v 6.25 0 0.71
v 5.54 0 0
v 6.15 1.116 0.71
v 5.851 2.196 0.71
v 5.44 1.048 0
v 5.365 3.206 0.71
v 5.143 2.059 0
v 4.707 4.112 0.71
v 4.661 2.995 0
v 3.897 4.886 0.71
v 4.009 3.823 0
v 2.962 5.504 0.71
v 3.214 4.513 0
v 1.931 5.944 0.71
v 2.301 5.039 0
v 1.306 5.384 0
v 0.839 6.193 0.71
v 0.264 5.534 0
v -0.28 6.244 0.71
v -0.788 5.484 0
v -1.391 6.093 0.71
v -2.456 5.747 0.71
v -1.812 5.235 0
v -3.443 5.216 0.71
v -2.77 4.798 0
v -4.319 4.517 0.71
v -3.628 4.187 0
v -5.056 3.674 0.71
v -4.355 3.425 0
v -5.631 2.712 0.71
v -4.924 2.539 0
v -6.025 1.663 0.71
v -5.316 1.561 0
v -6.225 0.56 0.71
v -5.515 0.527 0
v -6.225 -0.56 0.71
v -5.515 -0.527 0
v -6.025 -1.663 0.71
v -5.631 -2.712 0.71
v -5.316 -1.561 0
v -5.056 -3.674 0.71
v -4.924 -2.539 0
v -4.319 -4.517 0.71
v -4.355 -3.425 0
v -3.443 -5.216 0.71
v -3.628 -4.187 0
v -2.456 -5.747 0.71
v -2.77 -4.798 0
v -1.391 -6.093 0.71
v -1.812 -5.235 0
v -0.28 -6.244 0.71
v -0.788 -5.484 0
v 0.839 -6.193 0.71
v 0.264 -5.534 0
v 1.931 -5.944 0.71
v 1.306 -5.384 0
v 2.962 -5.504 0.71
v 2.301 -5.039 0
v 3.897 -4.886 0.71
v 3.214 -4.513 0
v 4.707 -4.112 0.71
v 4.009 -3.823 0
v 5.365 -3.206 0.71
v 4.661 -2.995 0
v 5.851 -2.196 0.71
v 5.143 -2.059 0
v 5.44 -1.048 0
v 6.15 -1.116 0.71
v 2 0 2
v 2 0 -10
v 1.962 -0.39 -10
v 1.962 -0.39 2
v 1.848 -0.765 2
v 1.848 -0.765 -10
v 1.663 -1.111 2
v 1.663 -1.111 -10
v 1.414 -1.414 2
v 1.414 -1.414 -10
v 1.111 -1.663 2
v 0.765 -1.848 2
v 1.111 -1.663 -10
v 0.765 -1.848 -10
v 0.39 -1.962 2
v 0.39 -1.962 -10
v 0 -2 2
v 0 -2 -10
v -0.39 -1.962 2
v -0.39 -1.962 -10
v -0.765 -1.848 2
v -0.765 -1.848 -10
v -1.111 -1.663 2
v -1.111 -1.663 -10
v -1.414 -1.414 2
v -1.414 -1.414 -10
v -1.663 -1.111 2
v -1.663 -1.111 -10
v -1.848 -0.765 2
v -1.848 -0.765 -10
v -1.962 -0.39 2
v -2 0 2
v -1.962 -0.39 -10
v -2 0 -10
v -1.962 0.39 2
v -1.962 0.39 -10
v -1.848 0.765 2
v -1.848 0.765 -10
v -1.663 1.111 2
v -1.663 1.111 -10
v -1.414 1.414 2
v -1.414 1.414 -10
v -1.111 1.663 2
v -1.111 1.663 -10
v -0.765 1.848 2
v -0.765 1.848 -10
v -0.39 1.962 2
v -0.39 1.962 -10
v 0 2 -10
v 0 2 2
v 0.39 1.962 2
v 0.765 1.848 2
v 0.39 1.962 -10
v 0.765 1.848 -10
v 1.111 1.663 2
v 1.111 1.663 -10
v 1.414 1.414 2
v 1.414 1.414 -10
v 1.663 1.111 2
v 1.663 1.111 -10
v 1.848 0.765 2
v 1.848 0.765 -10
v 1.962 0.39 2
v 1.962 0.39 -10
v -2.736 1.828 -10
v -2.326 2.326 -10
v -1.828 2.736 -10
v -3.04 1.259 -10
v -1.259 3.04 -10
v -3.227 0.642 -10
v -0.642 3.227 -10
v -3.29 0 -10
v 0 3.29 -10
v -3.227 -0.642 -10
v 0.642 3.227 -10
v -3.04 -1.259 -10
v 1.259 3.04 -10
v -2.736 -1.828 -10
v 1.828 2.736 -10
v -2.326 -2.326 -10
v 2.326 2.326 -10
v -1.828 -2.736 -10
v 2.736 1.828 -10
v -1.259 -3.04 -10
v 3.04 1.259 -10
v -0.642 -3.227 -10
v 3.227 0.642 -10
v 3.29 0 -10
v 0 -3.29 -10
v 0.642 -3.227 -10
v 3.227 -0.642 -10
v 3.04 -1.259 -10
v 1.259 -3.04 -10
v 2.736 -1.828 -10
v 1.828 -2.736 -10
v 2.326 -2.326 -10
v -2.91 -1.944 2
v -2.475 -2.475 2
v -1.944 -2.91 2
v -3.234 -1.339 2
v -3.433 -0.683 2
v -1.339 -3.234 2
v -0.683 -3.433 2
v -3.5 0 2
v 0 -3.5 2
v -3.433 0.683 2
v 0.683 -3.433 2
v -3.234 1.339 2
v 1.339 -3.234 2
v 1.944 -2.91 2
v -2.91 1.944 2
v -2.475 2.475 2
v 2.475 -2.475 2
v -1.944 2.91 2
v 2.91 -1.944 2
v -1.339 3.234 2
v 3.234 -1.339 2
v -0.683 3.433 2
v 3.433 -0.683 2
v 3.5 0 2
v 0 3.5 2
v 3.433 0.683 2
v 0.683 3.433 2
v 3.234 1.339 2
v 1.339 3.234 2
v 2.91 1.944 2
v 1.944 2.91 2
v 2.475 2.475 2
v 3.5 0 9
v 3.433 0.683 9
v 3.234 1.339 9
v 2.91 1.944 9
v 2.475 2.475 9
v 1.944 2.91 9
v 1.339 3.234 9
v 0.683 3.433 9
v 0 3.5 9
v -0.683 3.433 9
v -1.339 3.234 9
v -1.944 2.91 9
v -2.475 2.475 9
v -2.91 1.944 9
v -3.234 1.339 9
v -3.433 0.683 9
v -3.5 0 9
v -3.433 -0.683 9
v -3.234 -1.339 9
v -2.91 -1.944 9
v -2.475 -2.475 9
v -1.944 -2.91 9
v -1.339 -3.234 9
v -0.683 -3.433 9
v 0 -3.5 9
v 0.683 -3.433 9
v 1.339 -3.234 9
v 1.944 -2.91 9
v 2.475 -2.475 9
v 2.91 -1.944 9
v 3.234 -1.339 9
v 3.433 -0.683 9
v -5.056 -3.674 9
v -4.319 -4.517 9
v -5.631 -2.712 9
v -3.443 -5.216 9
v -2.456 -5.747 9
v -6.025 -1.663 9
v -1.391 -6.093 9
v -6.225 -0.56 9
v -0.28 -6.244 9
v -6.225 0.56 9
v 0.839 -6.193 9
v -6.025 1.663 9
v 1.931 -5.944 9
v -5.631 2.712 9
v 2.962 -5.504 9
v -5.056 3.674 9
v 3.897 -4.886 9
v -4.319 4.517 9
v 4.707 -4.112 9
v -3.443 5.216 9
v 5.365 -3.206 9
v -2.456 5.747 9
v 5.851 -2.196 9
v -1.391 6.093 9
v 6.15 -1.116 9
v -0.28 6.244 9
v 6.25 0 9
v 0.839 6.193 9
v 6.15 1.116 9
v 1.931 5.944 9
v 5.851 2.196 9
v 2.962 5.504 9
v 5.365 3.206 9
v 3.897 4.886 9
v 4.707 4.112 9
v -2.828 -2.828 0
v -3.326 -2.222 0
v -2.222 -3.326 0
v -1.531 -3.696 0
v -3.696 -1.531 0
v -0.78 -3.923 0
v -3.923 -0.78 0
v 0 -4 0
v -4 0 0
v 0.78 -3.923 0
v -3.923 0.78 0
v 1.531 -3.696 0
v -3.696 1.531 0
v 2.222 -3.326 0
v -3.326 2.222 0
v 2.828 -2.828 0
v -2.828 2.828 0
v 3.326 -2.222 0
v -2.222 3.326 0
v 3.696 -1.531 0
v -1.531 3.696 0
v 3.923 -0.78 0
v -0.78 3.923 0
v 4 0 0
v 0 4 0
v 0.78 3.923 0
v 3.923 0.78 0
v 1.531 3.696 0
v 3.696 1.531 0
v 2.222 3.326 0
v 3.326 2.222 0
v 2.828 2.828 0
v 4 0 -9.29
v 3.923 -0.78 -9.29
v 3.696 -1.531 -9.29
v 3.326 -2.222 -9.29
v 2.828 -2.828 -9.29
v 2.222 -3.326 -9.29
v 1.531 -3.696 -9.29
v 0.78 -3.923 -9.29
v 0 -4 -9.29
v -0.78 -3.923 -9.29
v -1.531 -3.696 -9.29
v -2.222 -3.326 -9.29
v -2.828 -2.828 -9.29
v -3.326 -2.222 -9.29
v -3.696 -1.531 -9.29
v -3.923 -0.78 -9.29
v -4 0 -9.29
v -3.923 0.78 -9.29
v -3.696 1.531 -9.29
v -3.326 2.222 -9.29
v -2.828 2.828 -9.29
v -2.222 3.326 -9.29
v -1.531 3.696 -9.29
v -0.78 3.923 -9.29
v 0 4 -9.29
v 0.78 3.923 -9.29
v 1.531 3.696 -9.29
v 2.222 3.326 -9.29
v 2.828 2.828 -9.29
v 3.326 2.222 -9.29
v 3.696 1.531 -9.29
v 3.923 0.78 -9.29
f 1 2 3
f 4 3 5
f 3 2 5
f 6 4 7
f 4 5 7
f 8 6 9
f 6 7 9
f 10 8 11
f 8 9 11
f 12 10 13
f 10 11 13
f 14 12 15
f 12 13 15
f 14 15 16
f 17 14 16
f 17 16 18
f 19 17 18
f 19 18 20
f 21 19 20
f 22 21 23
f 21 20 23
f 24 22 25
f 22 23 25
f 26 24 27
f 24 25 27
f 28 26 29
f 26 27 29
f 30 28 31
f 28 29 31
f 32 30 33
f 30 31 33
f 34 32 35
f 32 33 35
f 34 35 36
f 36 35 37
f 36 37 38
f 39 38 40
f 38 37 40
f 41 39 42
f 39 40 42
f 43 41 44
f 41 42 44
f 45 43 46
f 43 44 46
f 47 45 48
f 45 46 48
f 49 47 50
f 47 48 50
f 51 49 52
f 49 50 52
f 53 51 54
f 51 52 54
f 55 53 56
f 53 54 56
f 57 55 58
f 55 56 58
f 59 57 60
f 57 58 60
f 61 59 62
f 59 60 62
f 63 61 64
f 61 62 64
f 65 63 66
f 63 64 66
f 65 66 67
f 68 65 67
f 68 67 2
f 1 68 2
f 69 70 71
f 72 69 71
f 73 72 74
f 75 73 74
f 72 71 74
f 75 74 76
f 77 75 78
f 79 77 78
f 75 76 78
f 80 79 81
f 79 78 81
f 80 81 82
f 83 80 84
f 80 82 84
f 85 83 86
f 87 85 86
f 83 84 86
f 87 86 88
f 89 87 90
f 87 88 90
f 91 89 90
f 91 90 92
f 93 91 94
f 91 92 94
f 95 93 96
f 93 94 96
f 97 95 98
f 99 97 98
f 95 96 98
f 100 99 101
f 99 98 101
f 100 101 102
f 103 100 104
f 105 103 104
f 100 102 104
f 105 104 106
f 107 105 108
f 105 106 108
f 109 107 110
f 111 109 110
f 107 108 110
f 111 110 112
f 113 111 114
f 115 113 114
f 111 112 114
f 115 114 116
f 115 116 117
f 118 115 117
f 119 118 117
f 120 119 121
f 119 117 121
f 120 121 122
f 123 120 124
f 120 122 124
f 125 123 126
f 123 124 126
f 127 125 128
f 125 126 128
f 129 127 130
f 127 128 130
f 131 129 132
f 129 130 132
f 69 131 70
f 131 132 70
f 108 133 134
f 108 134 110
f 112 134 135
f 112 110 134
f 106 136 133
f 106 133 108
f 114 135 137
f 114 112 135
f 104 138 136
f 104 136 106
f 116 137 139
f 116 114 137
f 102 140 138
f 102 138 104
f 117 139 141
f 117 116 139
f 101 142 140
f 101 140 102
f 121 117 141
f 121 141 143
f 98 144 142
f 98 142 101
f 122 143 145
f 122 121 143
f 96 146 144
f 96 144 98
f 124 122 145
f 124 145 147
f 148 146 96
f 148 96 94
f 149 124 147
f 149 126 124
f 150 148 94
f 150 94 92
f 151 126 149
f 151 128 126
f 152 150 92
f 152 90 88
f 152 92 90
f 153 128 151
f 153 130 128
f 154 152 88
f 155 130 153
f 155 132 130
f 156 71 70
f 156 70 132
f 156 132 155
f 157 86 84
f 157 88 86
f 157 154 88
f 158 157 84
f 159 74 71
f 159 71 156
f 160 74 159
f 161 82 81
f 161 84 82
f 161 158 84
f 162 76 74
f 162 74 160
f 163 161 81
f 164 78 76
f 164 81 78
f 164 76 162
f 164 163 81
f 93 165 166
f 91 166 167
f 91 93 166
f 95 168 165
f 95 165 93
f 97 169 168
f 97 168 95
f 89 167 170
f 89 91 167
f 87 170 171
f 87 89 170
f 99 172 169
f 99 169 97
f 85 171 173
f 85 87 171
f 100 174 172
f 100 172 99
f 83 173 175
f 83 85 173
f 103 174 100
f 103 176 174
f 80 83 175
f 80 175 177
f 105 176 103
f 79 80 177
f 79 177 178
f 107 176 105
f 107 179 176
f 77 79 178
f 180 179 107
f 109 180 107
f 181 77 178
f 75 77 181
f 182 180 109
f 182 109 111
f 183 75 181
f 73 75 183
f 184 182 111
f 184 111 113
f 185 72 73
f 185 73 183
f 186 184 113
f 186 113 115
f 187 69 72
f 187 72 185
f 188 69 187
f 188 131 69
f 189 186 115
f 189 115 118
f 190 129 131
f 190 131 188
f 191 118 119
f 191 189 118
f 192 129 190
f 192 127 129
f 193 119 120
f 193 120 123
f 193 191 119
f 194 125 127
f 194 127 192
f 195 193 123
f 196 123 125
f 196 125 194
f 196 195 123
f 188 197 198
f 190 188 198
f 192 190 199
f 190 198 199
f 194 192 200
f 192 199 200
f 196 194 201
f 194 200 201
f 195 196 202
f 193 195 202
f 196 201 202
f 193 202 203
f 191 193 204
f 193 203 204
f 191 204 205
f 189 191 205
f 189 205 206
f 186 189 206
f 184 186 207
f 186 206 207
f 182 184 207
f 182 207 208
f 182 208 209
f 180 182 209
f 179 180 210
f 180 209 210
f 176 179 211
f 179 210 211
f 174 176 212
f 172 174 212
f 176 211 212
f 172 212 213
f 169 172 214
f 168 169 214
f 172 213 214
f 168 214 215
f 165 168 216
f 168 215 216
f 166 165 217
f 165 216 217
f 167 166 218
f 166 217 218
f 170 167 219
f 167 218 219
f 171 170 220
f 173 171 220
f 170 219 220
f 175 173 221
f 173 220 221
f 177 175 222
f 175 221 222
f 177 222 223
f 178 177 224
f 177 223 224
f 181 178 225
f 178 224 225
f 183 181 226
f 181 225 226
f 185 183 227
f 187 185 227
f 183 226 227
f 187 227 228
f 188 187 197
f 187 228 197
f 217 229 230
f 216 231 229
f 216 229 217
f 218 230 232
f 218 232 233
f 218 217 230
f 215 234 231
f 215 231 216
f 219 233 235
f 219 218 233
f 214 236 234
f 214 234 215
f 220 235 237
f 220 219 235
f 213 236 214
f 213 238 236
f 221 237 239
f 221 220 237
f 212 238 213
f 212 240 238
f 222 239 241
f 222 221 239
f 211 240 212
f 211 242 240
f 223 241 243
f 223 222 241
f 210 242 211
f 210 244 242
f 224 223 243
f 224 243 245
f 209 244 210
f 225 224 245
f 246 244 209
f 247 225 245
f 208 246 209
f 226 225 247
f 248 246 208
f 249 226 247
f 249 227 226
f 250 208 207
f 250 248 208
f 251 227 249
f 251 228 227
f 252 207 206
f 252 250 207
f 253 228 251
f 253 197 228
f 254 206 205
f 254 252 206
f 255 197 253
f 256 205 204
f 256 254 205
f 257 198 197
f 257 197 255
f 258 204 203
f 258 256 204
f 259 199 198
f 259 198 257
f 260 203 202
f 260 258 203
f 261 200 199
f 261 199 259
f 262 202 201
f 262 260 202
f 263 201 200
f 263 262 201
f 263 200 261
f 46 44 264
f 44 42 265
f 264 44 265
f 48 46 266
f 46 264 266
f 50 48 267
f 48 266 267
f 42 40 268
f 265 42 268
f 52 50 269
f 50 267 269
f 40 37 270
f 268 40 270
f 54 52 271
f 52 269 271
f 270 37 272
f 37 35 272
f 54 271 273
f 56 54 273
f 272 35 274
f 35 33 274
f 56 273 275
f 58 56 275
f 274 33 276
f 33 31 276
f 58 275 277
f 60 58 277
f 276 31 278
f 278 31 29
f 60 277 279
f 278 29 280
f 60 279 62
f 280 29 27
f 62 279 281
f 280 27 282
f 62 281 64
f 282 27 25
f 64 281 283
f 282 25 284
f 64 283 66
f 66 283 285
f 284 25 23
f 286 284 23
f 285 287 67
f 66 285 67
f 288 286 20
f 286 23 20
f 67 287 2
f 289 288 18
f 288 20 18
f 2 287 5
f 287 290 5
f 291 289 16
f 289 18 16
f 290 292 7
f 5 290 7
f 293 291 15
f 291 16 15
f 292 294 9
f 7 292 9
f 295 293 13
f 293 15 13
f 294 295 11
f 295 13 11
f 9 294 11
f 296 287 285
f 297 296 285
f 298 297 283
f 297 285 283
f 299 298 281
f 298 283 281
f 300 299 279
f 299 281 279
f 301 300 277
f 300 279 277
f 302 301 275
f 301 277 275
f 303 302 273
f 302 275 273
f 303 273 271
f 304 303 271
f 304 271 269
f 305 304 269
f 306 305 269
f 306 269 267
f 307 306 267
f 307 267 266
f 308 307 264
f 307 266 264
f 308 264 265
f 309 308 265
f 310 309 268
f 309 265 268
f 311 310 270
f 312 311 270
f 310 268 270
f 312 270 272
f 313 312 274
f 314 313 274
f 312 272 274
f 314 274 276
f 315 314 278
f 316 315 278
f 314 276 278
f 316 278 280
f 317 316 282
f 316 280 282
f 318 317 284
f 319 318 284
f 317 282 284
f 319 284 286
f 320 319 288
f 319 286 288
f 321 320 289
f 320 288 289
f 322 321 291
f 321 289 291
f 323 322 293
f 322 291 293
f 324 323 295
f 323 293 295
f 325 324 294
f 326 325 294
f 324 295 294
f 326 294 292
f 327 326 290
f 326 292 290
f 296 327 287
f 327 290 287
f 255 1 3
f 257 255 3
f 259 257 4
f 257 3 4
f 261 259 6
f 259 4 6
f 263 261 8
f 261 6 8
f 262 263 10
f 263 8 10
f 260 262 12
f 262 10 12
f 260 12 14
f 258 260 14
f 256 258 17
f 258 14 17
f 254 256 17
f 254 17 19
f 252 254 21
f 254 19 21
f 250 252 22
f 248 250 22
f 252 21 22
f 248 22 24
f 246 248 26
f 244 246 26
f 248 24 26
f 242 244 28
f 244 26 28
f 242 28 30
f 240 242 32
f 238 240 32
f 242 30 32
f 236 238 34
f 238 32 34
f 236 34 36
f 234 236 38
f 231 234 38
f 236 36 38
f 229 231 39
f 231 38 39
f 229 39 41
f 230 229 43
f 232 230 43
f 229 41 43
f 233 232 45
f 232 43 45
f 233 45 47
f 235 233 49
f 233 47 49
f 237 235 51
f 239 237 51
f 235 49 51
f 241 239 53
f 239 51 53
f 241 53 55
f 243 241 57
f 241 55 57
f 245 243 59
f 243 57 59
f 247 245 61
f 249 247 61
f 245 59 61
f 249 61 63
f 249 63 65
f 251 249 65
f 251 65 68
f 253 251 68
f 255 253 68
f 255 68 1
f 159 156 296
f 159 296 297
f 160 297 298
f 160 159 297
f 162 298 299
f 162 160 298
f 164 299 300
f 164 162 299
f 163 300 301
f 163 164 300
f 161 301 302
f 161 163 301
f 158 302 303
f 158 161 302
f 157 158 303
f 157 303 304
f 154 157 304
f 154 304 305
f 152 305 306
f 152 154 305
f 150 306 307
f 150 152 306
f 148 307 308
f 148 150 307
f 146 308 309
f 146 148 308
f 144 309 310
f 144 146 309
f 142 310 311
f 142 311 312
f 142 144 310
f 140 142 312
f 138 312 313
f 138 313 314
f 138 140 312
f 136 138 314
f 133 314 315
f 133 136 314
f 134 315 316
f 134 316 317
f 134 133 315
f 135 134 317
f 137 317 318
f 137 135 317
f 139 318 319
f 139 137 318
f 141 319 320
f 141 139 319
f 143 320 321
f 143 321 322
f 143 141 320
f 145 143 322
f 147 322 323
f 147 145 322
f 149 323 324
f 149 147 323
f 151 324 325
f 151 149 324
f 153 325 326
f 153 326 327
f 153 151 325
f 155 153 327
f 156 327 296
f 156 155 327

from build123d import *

# Parameters (mm, degrees)
F0_R     = 6.25
F1_DEPTH = 9
F2_R     = 3.5
F3_DEPTH = 7
F4_R     = 4
F5_DEPTH = 10
F6_R     = 2
F7_DEPTH = 12
F8_SIZE2 = 0.71
F8_SIZE  = 0.71
F9_SIZE2 = 0.71
F9_SIZE  = 0.71


with BuildPart() as f1:
    # F0 (on Top) → F1 (new body)
    with BuildSketch(Plane.XY):
        Circle(F0_R)
    extrude(amount=F1_DEPTH)

    # F2 (on face) → F3 (cut)
    with BuildSketch(Plane.XY.offset(9)):
        Circle(F2_R)
    extrude(amount=-F3_DEPTH, mode=Mode.SUBTRACT)

    # F4 (on face) → F5 (join)
    with BuildSketch(Plane(origin=(0, 0, 0), x_dir=(1, 0, 0), z_dir=(0, 0, -1))):
        Circle(F4_R)
    extrude(amount=F5_DEPTH)

    # F6 (on face) → F7 (cut)
    with BuildSketch(Plane(origin=(0, 0, -10), x_dir=(1, 0, 0), z_dir=(0, 0, -1))):
        Circle(F6_R)
    extrude(amount=-F7_DEPTH, mode=Mode.SUBTRACT)

    # F8
    f8_edges = [f1.edges().sort_by_distance(p)[0] for p in [
        (-6.25, 0, 0),
    ]]
    chamfer(f8_edges, length=F8_SIZE, length2=F8_SIZE2)

    # F9
    f9_edges = [f1.edges().sort_by_distance(p)[0] for p in [
        (-4, 0, -10),
    ]]
    chamfer(f9_edges, length=F9_SIZE, length2=F9_SIZE2)


solid = f1.part
